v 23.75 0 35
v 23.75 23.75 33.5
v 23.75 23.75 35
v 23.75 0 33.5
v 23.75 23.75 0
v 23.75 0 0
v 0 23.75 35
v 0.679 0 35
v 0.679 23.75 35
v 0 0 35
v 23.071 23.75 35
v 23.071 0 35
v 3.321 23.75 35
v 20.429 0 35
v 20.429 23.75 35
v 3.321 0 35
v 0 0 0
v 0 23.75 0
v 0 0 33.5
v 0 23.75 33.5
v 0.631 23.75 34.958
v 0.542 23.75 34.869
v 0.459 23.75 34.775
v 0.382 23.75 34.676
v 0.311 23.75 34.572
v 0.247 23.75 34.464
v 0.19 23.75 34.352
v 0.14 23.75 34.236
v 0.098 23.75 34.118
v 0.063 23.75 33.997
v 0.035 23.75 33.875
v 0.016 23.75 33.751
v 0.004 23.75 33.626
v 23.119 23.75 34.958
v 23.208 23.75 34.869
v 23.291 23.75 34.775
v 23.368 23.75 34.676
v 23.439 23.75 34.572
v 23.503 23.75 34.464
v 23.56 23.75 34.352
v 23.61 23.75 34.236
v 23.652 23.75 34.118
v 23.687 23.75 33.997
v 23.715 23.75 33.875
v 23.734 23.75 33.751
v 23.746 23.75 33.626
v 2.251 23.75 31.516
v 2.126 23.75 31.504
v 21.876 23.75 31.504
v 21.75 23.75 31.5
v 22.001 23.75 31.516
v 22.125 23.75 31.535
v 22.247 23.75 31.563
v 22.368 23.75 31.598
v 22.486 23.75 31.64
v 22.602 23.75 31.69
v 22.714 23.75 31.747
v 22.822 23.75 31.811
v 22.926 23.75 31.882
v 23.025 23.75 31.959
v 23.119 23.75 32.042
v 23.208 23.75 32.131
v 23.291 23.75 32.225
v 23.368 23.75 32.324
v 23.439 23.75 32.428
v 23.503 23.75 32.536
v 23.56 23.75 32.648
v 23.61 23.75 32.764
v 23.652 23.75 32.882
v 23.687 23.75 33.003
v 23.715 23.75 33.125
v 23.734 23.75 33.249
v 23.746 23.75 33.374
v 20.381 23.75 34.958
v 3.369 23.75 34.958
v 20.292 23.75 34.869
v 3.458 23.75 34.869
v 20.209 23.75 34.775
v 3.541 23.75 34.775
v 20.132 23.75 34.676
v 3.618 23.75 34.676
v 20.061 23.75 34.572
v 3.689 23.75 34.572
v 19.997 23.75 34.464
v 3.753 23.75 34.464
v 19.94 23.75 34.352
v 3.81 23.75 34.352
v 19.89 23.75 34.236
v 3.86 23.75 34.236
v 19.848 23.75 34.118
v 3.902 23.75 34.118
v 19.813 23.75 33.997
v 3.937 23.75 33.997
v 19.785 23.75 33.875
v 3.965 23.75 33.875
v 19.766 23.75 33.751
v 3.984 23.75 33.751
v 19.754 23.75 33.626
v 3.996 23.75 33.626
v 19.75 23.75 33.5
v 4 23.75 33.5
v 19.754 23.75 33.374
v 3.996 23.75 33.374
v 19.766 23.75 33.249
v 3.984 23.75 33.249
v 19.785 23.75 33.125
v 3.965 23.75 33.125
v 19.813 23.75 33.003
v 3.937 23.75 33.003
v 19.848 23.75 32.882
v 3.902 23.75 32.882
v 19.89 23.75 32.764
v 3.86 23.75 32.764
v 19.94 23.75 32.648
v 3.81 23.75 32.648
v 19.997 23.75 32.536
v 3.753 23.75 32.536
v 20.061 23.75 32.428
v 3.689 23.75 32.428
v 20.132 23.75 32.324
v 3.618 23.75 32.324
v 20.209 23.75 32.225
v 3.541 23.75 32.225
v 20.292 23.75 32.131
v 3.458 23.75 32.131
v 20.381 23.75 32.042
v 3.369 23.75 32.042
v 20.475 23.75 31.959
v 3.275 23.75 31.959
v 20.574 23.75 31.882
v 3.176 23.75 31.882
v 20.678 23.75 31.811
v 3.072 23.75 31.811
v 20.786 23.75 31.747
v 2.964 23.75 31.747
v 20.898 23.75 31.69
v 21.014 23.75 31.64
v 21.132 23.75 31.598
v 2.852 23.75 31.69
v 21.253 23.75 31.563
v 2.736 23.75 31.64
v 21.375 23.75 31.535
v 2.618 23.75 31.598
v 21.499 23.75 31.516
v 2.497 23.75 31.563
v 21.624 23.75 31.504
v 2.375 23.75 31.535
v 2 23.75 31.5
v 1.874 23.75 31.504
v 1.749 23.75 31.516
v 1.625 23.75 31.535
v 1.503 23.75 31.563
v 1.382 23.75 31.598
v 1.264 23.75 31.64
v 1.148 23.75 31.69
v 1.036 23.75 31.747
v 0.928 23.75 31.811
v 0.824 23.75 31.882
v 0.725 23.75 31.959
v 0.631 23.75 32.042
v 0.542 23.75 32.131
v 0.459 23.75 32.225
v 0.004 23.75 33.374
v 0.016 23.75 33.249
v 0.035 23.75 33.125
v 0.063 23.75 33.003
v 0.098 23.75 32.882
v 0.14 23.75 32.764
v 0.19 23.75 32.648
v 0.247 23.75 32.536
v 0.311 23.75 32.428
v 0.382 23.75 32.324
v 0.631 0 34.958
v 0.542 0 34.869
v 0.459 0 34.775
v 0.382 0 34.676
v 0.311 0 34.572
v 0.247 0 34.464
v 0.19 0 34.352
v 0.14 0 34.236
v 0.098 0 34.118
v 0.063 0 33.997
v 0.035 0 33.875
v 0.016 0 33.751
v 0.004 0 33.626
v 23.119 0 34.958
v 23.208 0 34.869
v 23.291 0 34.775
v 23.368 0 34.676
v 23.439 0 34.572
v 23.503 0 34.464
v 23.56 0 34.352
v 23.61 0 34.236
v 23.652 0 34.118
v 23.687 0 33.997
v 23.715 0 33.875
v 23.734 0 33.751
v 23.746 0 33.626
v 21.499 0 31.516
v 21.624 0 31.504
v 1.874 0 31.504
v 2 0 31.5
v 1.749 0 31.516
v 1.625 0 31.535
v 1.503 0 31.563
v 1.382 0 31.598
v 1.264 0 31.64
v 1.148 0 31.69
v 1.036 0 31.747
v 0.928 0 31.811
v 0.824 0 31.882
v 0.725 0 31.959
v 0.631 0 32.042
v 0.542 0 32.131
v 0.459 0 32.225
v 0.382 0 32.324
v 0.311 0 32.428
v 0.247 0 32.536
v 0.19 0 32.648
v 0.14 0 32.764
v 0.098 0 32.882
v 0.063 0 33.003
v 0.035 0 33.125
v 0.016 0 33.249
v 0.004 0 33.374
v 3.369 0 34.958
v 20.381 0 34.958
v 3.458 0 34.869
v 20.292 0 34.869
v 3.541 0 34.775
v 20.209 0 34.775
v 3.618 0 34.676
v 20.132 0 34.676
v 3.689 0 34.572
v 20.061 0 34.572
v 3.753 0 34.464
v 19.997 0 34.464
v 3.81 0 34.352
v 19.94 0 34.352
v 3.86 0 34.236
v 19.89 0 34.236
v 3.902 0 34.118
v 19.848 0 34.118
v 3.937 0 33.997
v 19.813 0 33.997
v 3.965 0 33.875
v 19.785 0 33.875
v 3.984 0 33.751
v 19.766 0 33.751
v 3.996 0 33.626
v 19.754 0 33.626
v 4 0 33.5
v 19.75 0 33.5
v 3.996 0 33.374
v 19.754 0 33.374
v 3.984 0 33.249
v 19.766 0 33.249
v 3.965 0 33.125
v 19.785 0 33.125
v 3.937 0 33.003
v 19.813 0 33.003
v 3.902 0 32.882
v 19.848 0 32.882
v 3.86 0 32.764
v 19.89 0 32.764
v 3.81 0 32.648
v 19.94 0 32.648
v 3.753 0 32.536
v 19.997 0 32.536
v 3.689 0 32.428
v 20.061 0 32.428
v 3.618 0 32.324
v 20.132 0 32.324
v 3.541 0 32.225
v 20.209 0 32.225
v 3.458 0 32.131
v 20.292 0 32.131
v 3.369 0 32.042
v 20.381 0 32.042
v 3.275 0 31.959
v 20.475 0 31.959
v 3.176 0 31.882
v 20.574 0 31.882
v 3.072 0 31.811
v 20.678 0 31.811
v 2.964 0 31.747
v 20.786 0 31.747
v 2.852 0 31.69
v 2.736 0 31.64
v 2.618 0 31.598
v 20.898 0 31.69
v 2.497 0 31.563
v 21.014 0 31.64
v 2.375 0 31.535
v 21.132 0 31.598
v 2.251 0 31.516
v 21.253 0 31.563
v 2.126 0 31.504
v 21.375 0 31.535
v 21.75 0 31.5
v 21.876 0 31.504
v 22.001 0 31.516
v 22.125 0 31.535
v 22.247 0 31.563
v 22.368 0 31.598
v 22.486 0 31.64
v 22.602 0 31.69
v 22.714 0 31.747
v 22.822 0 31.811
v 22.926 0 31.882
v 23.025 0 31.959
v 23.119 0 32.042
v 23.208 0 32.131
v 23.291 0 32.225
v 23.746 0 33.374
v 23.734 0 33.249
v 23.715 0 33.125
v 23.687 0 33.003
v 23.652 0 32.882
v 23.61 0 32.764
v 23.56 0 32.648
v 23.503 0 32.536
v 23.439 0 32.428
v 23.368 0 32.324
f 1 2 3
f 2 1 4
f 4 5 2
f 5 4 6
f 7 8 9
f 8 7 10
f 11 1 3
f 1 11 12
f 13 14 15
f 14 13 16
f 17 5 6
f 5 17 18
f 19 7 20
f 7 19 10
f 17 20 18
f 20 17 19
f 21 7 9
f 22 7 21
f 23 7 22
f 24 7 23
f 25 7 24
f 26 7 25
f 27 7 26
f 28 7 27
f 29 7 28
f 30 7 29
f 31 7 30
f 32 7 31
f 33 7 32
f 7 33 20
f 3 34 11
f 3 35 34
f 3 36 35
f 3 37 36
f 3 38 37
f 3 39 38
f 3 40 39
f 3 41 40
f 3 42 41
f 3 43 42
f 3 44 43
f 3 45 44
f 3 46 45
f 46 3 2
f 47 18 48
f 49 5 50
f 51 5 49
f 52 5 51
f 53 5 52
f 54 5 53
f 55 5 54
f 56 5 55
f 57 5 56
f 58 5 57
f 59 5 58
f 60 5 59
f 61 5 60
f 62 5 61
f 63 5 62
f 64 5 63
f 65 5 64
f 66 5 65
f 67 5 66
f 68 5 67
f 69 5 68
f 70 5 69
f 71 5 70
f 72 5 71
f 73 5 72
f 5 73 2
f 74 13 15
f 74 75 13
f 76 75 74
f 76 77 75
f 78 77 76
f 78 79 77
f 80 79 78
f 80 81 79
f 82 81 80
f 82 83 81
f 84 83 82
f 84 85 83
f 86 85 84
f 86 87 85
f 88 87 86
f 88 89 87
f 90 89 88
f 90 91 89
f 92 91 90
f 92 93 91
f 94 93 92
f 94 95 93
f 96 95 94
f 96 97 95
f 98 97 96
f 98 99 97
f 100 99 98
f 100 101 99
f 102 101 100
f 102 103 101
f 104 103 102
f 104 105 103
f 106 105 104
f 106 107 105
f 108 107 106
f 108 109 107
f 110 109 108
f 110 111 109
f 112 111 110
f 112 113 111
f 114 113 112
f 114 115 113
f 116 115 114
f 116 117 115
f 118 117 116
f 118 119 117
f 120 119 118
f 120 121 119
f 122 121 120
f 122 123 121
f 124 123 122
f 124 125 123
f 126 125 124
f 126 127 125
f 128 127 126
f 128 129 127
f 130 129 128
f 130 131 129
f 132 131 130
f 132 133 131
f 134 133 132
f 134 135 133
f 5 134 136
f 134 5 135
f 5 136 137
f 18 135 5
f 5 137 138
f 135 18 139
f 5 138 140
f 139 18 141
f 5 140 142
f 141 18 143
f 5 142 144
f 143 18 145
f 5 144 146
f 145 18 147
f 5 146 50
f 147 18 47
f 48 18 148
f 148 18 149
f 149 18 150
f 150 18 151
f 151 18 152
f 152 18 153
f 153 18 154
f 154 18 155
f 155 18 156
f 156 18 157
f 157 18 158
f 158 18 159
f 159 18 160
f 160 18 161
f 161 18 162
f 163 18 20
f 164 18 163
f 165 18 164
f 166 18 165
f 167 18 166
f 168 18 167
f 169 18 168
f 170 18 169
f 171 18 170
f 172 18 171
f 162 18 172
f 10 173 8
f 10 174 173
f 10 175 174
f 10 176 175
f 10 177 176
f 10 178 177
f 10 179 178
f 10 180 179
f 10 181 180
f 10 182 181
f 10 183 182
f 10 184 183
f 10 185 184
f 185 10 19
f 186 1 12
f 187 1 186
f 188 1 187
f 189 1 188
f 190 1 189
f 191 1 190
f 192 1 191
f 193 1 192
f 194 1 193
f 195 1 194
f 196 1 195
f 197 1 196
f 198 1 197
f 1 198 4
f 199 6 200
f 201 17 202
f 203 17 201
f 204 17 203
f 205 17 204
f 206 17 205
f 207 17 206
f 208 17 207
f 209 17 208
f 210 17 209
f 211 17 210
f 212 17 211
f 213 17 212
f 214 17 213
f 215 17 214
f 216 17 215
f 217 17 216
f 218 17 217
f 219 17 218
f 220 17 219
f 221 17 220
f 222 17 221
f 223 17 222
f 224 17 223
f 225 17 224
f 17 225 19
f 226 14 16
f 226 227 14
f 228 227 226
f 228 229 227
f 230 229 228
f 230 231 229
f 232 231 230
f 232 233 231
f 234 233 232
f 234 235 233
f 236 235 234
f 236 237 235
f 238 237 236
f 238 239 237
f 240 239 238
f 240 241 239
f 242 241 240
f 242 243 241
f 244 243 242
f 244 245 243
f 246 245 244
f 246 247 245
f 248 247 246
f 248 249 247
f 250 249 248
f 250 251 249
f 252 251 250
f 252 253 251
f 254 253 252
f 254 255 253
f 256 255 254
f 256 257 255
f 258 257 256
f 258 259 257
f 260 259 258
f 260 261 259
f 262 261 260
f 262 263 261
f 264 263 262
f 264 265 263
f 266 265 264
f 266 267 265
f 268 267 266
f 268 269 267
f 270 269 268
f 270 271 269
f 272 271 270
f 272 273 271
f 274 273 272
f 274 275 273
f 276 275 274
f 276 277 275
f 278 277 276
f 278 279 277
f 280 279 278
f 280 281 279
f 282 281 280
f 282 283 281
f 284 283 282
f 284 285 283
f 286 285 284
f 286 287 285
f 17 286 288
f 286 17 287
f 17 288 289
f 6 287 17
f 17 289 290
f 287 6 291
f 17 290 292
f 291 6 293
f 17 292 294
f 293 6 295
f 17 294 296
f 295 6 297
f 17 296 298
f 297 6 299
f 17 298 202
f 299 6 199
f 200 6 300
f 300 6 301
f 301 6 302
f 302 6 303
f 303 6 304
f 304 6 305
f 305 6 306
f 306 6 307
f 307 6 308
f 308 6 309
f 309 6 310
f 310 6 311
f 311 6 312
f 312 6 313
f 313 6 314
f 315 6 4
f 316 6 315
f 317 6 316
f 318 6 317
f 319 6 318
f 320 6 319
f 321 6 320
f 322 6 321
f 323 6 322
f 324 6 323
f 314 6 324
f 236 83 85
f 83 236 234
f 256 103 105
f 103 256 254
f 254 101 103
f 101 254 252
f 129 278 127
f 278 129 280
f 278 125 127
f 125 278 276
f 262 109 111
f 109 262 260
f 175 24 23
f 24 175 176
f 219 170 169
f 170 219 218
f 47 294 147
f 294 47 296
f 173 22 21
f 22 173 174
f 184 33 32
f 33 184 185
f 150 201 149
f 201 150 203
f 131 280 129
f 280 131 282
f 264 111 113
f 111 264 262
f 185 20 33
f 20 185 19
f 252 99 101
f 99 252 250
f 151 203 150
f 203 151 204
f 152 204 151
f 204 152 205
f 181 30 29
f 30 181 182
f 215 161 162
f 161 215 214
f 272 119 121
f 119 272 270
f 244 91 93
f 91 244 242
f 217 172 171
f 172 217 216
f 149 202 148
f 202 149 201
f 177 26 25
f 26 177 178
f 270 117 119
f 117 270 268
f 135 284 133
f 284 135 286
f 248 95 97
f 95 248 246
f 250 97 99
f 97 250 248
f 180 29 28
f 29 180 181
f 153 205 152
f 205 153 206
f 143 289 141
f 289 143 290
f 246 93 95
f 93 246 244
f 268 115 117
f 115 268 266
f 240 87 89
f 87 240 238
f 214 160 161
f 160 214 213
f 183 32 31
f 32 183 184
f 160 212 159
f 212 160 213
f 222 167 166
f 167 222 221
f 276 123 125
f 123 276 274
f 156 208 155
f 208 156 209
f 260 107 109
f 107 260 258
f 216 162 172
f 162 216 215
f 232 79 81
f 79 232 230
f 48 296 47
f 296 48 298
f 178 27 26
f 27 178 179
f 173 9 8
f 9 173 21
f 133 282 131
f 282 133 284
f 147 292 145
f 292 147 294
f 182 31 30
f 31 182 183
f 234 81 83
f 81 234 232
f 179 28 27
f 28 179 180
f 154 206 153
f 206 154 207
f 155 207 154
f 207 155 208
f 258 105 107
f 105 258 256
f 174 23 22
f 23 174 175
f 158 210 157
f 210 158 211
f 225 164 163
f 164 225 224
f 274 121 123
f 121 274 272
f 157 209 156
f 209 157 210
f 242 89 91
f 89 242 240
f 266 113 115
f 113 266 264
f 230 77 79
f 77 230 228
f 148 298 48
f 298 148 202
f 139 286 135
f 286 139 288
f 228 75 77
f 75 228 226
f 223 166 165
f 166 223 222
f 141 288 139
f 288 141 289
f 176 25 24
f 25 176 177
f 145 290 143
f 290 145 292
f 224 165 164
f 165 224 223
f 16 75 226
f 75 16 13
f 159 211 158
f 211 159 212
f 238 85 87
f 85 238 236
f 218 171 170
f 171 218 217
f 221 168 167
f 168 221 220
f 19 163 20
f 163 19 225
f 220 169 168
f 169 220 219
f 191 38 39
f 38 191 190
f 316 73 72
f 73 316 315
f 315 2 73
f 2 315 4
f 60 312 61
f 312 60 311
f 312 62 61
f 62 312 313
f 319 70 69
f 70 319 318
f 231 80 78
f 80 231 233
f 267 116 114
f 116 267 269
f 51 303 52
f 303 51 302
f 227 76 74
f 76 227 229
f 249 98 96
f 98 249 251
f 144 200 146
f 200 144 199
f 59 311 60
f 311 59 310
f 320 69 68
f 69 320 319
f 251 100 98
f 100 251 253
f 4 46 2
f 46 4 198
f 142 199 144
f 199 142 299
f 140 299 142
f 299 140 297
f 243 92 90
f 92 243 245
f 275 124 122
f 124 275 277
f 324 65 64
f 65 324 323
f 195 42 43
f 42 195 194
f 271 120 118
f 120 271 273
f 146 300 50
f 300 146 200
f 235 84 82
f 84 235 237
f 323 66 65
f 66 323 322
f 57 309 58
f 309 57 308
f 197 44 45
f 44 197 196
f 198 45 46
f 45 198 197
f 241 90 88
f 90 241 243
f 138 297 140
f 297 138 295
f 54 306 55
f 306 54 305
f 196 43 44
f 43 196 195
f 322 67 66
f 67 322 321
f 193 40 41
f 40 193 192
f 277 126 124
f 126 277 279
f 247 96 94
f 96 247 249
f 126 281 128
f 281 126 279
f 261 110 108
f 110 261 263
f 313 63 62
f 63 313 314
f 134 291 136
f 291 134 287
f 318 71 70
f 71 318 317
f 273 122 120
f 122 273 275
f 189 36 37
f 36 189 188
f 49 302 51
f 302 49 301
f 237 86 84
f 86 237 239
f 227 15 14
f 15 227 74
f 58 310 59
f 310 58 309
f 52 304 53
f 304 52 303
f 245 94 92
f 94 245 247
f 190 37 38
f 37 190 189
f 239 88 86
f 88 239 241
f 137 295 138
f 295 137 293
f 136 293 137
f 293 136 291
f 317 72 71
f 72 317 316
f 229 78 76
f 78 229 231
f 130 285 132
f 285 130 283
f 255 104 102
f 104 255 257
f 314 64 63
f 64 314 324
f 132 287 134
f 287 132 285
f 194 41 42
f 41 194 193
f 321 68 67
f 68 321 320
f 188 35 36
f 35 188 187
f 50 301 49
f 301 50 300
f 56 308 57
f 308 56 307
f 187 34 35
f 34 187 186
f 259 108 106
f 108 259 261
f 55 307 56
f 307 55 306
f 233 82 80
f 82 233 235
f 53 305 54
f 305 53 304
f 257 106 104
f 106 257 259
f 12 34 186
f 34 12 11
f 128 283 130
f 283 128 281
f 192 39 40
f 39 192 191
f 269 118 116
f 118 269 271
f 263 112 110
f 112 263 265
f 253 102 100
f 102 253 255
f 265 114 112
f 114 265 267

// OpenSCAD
RodDiameter = 4.0;
RodSpacing =16.5;

PadLength = 23.75;
PadHeight = 35;


module trayLevelPad()
{
    color("blue")difference()
    {
        difference()
        {
        cube([PadLength,PadLength,PadHeight]);
        translate([radius(),yMove(),zMove(0.5)])
        rotate(a=[-90,0,0])
        cylinder($fn=100,barLength(), radius(), radius(), false);
        }
        translate([PadLength-radius(),yMove(),zMove(0.5)])
        rotate(a=[-90,0,0])
        cylinder($fn=100,barLength(), radius(), radius(), false);
    }
}

function zMove(x=0)=PadHeight-(RodDiameter/4)-x;
function yMove(x=0)=(x==0)? -1:x;
function radius(x=RodDiameter/2)= x;
function barLength(x=PadLength +2) = x;


trayLevelPad();
